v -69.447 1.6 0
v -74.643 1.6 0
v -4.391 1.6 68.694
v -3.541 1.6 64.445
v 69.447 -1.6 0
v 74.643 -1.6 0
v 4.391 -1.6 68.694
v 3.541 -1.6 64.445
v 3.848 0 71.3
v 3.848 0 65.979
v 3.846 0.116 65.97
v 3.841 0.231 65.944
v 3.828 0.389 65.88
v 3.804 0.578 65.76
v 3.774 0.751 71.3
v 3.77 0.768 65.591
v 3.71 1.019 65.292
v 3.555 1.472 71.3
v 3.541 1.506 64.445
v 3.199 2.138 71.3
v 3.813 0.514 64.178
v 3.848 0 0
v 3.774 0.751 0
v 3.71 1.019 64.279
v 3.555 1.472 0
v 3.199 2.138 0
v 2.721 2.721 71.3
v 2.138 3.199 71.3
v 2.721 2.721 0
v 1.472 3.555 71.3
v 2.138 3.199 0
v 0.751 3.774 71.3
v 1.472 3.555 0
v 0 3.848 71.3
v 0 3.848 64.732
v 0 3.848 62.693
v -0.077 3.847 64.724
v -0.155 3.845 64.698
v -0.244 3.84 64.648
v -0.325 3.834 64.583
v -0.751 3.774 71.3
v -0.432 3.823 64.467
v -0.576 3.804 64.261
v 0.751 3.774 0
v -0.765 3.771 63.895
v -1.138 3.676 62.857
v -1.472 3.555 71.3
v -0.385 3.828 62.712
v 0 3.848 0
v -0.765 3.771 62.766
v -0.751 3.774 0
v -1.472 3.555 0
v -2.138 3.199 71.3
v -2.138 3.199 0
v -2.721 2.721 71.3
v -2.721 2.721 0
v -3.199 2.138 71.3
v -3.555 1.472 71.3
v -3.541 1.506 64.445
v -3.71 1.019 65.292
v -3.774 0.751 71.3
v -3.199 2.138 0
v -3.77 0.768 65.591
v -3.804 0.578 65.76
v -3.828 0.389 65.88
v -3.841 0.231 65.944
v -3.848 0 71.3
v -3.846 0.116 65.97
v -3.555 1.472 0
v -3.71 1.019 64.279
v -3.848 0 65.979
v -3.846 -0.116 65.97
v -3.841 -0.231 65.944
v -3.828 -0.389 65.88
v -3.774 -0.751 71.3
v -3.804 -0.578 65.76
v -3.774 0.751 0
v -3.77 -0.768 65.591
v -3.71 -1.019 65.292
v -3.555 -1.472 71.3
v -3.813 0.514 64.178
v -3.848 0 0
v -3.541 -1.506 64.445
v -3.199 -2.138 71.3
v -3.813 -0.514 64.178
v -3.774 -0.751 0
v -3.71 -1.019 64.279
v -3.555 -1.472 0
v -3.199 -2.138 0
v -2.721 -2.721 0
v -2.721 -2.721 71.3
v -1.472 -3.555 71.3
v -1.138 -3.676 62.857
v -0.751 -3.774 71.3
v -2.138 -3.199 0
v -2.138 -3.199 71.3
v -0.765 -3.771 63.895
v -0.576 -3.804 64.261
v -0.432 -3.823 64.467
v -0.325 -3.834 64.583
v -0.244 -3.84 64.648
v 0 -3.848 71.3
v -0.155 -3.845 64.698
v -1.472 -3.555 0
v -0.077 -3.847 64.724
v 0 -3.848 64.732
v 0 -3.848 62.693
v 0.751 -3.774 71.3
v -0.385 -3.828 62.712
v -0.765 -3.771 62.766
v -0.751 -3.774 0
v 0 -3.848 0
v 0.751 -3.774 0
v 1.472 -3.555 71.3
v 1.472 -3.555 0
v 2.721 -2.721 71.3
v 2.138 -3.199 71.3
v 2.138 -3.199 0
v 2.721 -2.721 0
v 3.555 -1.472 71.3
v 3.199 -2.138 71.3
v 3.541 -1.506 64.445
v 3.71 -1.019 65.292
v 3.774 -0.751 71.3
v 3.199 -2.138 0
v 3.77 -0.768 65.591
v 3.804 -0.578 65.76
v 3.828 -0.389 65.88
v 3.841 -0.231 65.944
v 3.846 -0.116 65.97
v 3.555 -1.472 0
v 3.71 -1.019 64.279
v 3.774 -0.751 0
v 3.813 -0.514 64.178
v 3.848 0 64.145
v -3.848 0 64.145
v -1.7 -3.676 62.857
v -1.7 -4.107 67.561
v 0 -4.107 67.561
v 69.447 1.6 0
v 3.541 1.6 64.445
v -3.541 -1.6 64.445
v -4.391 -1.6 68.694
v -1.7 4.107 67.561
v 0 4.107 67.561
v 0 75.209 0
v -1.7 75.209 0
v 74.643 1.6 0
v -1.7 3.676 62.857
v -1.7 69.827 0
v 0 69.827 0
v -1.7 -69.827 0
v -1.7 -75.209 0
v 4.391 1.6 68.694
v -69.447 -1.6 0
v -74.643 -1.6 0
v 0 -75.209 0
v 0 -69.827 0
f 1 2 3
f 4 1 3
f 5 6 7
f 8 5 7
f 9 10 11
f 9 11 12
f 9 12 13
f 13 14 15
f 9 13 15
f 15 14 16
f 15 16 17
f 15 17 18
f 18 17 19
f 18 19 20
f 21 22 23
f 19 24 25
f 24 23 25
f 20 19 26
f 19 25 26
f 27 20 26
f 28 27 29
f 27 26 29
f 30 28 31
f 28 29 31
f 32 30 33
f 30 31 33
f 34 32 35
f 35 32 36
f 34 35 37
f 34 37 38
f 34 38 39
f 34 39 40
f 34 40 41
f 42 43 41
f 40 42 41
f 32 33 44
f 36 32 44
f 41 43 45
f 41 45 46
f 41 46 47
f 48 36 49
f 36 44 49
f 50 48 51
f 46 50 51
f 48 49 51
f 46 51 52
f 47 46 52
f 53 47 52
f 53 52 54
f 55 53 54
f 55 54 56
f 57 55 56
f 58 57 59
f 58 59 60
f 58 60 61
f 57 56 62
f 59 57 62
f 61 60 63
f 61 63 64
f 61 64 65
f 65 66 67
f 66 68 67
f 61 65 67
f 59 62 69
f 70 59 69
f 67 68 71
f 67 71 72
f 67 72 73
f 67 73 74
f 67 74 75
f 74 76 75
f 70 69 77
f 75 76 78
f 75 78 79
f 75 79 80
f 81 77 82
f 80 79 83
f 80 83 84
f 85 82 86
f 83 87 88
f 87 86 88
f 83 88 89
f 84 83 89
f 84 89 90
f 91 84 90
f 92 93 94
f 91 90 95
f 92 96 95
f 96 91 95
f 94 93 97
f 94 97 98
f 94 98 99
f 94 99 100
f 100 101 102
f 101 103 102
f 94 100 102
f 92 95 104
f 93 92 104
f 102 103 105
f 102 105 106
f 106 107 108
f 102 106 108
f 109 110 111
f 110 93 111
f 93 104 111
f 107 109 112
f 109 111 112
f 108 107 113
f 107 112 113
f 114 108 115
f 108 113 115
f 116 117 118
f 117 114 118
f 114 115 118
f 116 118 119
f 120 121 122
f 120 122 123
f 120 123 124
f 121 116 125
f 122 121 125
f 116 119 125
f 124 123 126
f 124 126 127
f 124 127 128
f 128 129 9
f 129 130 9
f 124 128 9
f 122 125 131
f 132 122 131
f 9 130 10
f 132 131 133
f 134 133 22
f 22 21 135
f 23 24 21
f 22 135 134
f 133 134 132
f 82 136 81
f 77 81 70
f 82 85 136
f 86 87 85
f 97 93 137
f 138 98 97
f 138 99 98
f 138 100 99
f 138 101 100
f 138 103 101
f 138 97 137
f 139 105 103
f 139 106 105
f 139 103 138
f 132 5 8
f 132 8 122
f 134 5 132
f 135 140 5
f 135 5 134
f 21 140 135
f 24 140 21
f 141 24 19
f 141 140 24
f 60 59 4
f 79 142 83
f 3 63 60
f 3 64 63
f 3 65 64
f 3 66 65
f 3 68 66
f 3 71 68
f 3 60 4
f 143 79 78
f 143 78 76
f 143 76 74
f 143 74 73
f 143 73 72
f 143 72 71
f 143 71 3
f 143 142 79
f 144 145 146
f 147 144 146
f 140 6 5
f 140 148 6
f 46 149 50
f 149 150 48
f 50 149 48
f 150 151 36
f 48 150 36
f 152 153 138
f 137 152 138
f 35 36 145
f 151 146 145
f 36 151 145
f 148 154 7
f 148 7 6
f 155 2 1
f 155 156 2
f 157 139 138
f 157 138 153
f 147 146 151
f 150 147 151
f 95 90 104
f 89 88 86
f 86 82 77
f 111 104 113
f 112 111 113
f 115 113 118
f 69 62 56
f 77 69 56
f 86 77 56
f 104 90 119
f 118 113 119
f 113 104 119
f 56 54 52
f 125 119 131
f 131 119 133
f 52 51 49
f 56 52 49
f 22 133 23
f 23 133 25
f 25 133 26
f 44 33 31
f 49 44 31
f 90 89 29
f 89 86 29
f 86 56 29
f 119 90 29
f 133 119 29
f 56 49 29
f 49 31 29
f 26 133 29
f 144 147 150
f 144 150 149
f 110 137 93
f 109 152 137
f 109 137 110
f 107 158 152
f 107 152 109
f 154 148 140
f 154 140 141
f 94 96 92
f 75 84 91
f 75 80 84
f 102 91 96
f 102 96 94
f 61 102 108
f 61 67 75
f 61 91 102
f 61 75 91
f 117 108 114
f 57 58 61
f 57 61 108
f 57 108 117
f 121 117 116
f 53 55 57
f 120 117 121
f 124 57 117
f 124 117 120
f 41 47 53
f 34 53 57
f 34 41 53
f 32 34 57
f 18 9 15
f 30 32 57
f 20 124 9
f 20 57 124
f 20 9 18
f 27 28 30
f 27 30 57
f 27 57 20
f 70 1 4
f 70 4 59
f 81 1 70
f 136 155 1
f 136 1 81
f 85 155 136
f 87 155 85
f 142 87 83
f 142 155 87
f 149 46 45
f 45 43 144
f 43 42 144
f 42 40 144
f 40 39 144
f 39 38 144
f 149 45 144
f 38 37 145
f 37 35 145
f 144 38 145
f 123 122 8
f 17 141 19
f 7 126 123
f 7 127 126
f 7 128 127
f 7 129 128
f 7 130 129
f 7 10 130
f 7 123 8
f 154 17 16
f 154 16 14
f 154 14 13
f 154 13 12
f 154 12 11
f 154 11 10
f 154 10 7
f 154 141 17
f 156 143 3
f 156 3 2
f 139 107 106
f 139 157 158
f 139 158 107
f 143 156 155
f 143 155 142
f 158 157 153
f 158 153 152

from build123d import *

# Parameters (mm, degrees)
F0_R     = 3.847724
F1_DEPTH = 71.3
F3_DEPTH = 1.6
F6_DEPTH = 1.7


with BuildPart() as f1:
    # F0 (on Top) → F1 (new body)
    with BuildSketch(Plane.XY):
        Circle(F0_R)
    extrude(amount=F1_DEPTH)

    # F2 (on Front) → F3 (join)
    with BuildSketch(Plane.XZ):
        Polygon((-3.540918, 64.444698), (-4.390738, 68.693802), (-74.642539, 0), (-69.447245, 0), align=None)
    extrude(amount=-F3_DEPTH)

    # F4: F1 across plane


with BuildPart() as f1_1:
    add(f1.part)
    add(f1.part.mirror(Plane.YZ))

    # F5 (on Right) → F6 (join)
    with BuildSketch(Plane.YZ):
        Polygon((-3.675503, 62.856996), (-4.107466, 67.560703), (-75.209089, 0), (-69.826894, 0), align=None)
    extrude(amount=-F6_DEPTH)

    # F7: F1 across plane


with BuildPart() as f1_2:
    add(f1_1.part)
    add(f1_1.part.mirror(Plane.XZ))


solid = f1_2.part
